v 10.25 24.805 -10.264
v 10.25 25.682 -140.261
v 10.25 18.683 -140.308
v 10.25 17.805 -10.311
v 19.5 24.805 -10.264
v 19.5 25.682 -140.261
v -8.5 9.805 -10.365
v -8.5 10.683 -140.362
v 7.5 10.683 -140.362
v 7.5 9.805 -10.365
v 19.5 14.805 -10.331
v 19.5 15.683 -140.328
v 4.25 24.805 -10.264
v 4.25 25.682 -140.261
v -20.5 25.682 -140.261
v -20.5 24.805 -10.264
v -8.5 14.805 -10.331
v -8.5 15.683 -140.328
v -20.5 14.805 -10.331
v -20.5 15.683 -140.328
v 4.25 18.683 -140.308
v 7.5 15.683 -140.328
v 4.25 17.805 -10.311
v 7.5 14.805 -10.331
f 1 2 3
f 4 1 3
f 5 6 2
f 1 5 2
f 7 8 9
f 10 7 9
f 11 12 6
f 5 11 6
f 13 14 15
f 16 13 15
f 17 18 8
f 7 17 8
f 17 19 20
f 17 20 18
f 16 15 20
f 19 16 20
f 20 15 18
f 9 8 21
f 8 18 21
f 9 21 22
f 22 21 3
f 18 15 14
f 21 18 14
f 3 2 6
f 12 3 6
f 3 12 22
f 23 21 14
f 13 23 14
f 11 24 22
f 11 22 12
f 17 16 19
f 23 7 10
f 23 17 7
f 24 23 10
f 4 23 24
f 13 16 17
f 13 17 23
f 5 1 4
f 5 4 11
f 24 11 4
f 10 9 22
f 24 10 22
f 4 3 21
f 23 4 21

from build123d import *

# Parameters (mm, degrees)
EXTRUDE_1_DEPTH = 130


with BuildPart() as part:
    # 草图1 → 凸台-拉伸1 (new body)
    with BuildSketch(Plane(origin=(0, 0.070410314, -10.430830946), x_dir=(1, 0, 0), z_dir=(0, -0.006750057654754126, 0.9999772181013213))):
        Polygon((-8.5, 9.735119508), (-0.5, 9.735119508), (-0.5, 24.735119508), (-20.5, 24.735119508), (-20.5, 14.735119508), (-8.5, 14.735119508), align=None)
        Polygon((-0.5, 24.735119508), (-0.5, 9.735119508), (7.5, 9.735119508), (7.5, 14.735119508), (19.5, 14.735119508), (19.5, 24.735119508), (10.2499492, 24.735119508), (10.2499492, 22.735119508), (10.2499492, 17.735119508), (4.2499492, 17.735119508), (4.2499492, 22.735119508), (4.2499492, 24.735119508), align=None)
    extrude(amount=-EXTRUDE_1_DEPTH)


solid = part.part
